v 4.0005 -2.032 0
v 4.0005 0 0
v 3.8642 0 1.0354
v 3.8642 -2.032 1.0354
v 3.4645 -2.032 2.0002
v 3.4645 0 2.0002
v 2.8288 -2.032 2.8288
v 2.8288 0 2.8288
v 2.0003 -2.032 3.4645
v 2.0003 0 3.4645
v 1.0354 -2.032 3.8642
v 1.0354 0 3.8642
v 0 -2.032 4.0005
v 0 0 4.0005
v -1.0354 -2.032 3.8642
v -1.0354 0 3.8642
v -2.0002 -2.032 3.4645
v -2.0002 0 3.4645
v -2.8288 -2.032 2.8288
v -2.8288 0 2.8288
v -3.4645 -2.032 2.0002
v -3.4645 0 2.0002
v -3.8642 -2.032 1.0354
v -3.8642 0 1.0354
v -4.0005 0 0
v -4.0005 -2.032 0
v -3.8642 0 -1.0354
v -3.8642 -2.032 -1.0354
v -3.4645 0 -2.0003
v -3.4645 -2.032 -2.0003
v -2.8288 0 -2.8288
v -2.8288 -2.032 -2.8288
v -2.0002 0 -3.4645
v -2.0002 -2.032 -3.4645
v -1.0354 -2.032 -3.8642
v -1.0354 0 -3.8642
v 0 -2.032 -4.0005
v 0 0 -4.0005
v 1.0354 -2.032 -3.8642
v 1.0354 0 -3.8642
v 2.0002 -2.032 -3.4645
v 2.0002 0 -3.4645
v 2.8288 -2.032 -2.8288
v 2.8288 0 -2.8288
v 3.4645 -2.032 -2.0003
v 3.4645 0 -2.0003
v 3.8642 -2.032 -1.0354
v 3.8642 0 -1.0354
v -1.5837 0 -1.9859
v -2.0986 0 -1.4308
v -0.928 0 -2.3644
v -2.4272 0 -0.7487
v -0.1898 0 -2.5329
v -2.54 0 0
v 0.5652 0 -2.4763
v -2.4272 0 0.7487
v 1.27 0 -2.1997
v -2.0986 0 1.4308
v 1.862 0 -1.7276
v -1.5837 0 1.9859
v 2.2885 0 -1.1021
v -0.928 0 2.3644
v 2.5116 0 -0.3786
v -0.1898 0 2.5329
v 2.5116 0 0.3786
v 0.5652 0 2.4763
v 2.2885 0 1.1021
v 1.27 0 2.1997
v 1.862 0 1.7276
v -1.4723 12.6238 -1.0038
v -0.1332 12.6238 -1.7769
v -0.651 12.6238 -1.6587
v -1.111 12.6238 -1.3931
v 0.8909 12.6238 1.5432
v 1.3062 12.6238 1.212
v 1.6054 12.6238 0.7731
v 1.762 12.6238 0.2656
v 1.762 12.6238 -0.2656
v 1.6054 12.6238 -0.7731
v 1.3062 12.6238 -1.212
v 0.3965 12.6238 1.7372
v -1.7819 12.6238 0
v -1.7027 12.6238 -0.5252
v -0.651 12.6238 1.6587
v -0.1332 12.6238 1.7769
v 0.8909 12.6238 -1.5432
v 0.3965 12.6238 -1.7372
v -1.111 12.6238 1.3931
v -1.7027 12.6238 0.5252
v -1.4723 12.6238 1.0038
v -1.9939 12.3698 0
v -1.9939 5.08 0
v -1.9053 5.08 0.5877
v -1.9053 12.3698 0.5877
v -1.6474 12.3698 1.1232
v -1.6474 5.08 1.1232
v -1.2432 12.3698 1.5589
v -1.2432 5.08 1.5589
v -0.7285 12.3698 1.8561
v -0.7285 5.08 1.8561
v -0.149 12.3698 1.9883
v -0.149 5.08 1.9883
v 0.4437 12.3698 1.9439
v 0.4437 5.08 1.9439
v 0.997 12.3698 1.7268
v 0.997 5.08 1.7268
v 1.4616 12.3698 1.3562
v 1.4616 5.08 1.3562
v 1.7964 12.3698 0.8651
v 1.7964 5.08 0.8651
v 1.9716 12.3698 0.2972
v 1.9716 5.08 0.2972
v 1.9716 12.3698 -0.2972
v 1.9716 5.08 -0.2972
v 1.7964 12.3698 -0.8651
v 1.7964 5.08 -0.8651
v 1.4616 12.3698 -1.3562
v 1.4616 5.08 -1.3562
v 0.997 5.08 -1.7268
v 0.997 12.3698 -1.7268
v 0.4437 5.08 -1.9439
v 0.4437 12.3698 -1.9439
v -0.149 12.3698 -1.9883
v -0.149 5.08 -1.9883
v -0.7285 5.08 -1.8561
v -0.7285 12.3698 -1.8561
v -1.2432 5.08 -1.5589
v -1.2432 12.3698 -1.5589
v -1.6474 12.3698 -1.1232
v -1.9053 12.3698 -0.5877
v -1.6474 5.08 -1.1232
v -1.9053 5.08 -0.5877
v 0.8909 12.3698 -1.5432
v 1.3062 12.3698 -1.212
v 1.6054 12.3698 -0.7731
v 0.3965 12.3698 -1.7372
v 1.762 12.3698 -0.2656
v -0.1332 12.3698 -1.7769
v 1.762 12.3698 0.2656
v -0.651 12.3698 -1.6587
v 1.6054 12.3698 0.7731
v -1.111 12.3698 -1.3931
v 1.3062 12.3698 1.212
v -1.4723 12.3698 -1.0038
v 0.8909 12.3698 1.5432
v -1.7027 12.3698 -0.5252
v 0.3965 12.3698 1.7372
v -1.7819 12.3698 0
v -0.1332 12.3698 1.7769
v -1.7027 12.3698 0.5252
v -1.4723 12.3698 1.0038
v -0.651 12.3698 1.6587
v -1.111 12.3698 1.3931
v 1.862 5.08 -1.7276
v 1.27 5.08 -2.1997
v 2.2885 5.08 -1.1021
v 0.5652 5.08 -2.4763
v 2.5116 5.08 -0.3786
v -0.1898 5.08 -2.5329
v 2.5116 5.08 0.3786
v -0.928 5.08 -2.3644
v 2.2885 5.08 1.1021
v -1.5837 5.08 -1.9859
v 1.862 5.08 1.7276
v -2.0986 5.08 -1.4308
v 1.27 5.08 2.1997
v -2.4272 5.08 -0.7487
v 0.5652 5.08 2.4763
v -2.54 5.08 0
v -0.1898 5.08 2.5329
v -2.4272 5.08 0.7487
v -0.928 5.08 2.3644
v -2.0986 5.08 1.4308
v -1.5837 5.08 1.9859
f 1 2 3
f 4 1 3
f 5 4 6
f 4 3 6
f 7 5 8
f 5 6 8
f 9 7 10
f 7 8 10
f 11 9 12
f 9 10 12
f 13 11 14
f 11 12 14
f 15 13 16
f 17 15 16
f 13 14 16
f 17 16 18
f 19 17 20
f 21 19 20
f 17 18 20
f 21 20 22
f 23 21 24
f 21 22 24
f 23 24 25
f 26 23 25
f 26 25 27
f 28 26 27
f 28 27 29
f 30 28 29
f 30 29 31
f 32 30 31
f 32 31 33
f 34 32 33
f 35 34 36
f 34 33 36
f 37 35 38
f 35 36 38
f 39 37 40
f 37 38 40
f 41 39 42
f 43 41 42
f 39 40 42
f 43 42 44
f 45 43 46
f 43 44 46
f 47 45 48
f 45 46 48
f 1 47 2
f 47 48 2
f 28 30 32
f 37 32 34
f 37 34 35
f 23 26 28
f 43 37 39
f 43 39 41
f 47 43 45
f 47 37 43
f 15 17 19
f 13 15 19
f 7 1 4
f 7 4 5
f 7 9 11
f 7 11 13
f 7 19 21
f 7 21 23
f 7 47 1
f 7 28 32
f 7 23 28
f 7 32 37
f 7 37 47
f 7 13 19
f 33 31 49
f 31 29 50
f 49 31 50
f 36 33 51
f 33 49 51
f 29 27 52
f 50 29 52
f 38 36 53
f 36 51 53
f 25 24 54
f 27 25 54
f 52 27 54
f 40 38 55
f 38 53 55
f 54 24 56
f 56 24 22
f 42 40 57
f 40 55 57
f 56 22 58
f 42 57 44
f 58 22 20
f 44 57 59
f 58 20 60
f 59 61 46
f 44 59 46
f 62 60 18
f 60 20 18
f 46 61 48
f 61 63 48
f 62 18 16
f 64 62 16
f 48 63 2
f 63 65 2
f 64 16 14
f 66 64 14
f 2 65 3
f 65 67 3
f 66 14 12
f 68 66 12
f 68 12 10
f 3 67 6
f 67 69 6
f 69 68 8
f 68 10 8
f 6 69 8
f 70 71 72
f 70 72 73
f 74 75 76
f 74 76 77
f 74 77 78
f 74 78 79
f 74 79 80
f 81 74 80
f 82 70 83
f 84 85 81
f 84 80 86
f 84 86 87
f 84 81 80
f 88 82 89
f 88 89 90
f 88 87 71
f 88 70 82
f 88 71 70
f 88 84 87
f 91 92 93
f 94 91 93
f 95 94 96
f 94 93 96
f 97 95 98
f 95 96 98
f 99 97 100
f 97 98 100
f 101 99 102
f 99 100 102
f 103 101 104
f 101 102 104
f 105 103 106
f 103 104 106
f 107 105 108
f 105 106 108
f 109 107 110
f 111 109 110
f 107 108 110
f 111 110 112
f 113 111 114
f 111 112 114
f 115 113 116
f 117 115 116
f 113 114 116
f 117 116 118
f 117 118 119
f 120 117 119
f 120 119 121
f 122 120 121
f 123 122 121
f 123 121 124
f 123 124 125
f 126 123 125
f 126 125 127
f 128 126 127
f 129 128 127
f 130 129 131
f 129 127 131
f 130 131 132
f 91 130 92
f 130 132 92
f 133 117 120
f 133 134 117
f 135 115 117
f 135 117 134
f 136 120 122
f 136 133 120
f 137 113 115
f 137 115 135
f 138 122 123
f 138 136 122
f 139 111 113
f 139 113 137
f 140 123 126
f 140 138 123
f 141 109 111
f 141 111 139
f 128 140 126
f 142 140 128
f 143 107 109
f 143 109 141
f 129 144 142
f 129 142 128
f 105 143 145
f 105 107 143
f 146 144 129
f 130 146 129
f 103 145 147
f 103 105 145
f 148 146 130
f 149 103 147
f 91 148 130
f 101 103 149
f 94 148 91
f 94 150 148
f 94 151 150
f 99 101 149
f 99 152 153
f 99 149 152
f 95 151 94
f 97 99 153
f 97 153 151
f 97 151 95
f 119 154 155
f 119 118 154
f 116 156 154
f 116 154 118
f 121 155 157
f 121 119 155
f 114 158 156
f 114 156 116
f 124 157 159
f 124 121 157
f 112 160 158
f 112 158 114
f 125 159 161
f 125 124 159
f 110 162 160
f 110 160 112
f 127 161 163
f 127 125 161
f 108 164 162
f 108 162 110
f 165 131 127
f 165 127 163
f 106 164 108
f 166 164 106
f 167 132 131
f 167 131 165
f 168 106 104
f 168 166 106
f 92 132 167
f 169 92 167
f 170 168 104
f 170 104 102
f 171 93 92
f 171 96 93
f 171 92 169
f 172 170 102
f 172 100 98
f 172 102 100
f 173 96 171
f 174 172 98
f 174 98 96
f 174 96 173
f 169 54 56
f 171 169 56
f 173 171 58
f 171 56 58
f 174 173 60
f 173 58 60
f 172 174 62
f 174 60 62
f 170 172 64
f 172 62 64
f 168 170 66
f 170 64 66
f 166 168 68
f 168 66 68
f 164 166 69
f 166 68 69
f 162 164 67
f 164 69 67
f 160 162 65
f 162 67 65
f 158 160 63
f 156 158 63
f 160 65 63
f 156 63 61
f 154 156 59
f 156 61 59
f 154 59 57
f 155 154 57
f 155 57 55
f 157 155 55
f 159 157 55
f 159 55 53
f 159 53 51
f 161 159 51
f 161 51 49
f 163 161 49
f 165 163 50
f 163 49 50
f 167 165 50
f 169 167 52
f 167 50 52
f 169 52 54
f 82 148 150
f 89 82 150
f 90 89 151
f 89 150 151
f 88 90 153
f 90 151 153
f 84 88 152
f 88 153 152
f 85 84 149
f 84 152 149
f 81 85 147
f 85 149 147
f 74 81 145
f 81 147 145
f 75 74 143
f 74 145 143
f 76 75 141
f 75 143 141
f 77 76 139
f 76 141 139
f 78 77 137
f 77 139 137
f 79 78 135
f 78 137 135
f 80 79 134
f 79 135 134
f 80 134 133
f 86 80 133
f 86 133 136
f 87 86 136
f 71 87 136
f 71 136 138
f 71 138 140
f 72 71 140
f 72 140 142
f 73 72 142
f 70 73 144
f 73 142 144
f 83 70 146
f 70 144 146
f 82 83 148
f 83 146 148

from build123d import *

# Parameters (mm, degrees)
F0_R     = 4.0005
F0_R_2   = 2.9972
F1_DEPTH = 2.032
F2_R     = 2.54
F3_DEPTH = 5.08
F4_R     = 1.9939
F5_DEPTH = 7.2898
F6_R     = 1.781887
F7_DEPTH = 0.254


with BuildPart() as f1:
    # F0 (on Front) → F1 (new body)
    with BuildSketch(Plane.XZ):
        Circle(F0_R)
        Circle(F0_R_2, mode=Mode.SUBTRACT)
        Circle(F0_R_2)
    extrude(amount=F1_DEPTH)

    # F2 (on face) → F3 (join)
    with BuildSketch(Plane(origin=(0, 0, 0), x_dir=(-1, 0, 0), z_dir=(0, 1, 0))):
        Circle(F2_R)
    extrude(amount=F3_DEPTH)

    # F4 (on face) → F5 (join)
    with BuildSketch(Plane(origin=(0, 5.08, 0), x_dir=(-1, 0, 0), z_dir=(0, 1, 0))):
        Circle(F4_R)
    extrude(amount=F5_DEPTH)

    # F6 (on face) → F7 (join)
    with BuildSketch(Plane(origin=(0, 12.3698, 0), x_dir=(-1, 0, 0), z_dir=(0, 1, 0))):
        Circle(F6_R)
    extrude(amount=F7_DEPTH)


solid = f1.part
